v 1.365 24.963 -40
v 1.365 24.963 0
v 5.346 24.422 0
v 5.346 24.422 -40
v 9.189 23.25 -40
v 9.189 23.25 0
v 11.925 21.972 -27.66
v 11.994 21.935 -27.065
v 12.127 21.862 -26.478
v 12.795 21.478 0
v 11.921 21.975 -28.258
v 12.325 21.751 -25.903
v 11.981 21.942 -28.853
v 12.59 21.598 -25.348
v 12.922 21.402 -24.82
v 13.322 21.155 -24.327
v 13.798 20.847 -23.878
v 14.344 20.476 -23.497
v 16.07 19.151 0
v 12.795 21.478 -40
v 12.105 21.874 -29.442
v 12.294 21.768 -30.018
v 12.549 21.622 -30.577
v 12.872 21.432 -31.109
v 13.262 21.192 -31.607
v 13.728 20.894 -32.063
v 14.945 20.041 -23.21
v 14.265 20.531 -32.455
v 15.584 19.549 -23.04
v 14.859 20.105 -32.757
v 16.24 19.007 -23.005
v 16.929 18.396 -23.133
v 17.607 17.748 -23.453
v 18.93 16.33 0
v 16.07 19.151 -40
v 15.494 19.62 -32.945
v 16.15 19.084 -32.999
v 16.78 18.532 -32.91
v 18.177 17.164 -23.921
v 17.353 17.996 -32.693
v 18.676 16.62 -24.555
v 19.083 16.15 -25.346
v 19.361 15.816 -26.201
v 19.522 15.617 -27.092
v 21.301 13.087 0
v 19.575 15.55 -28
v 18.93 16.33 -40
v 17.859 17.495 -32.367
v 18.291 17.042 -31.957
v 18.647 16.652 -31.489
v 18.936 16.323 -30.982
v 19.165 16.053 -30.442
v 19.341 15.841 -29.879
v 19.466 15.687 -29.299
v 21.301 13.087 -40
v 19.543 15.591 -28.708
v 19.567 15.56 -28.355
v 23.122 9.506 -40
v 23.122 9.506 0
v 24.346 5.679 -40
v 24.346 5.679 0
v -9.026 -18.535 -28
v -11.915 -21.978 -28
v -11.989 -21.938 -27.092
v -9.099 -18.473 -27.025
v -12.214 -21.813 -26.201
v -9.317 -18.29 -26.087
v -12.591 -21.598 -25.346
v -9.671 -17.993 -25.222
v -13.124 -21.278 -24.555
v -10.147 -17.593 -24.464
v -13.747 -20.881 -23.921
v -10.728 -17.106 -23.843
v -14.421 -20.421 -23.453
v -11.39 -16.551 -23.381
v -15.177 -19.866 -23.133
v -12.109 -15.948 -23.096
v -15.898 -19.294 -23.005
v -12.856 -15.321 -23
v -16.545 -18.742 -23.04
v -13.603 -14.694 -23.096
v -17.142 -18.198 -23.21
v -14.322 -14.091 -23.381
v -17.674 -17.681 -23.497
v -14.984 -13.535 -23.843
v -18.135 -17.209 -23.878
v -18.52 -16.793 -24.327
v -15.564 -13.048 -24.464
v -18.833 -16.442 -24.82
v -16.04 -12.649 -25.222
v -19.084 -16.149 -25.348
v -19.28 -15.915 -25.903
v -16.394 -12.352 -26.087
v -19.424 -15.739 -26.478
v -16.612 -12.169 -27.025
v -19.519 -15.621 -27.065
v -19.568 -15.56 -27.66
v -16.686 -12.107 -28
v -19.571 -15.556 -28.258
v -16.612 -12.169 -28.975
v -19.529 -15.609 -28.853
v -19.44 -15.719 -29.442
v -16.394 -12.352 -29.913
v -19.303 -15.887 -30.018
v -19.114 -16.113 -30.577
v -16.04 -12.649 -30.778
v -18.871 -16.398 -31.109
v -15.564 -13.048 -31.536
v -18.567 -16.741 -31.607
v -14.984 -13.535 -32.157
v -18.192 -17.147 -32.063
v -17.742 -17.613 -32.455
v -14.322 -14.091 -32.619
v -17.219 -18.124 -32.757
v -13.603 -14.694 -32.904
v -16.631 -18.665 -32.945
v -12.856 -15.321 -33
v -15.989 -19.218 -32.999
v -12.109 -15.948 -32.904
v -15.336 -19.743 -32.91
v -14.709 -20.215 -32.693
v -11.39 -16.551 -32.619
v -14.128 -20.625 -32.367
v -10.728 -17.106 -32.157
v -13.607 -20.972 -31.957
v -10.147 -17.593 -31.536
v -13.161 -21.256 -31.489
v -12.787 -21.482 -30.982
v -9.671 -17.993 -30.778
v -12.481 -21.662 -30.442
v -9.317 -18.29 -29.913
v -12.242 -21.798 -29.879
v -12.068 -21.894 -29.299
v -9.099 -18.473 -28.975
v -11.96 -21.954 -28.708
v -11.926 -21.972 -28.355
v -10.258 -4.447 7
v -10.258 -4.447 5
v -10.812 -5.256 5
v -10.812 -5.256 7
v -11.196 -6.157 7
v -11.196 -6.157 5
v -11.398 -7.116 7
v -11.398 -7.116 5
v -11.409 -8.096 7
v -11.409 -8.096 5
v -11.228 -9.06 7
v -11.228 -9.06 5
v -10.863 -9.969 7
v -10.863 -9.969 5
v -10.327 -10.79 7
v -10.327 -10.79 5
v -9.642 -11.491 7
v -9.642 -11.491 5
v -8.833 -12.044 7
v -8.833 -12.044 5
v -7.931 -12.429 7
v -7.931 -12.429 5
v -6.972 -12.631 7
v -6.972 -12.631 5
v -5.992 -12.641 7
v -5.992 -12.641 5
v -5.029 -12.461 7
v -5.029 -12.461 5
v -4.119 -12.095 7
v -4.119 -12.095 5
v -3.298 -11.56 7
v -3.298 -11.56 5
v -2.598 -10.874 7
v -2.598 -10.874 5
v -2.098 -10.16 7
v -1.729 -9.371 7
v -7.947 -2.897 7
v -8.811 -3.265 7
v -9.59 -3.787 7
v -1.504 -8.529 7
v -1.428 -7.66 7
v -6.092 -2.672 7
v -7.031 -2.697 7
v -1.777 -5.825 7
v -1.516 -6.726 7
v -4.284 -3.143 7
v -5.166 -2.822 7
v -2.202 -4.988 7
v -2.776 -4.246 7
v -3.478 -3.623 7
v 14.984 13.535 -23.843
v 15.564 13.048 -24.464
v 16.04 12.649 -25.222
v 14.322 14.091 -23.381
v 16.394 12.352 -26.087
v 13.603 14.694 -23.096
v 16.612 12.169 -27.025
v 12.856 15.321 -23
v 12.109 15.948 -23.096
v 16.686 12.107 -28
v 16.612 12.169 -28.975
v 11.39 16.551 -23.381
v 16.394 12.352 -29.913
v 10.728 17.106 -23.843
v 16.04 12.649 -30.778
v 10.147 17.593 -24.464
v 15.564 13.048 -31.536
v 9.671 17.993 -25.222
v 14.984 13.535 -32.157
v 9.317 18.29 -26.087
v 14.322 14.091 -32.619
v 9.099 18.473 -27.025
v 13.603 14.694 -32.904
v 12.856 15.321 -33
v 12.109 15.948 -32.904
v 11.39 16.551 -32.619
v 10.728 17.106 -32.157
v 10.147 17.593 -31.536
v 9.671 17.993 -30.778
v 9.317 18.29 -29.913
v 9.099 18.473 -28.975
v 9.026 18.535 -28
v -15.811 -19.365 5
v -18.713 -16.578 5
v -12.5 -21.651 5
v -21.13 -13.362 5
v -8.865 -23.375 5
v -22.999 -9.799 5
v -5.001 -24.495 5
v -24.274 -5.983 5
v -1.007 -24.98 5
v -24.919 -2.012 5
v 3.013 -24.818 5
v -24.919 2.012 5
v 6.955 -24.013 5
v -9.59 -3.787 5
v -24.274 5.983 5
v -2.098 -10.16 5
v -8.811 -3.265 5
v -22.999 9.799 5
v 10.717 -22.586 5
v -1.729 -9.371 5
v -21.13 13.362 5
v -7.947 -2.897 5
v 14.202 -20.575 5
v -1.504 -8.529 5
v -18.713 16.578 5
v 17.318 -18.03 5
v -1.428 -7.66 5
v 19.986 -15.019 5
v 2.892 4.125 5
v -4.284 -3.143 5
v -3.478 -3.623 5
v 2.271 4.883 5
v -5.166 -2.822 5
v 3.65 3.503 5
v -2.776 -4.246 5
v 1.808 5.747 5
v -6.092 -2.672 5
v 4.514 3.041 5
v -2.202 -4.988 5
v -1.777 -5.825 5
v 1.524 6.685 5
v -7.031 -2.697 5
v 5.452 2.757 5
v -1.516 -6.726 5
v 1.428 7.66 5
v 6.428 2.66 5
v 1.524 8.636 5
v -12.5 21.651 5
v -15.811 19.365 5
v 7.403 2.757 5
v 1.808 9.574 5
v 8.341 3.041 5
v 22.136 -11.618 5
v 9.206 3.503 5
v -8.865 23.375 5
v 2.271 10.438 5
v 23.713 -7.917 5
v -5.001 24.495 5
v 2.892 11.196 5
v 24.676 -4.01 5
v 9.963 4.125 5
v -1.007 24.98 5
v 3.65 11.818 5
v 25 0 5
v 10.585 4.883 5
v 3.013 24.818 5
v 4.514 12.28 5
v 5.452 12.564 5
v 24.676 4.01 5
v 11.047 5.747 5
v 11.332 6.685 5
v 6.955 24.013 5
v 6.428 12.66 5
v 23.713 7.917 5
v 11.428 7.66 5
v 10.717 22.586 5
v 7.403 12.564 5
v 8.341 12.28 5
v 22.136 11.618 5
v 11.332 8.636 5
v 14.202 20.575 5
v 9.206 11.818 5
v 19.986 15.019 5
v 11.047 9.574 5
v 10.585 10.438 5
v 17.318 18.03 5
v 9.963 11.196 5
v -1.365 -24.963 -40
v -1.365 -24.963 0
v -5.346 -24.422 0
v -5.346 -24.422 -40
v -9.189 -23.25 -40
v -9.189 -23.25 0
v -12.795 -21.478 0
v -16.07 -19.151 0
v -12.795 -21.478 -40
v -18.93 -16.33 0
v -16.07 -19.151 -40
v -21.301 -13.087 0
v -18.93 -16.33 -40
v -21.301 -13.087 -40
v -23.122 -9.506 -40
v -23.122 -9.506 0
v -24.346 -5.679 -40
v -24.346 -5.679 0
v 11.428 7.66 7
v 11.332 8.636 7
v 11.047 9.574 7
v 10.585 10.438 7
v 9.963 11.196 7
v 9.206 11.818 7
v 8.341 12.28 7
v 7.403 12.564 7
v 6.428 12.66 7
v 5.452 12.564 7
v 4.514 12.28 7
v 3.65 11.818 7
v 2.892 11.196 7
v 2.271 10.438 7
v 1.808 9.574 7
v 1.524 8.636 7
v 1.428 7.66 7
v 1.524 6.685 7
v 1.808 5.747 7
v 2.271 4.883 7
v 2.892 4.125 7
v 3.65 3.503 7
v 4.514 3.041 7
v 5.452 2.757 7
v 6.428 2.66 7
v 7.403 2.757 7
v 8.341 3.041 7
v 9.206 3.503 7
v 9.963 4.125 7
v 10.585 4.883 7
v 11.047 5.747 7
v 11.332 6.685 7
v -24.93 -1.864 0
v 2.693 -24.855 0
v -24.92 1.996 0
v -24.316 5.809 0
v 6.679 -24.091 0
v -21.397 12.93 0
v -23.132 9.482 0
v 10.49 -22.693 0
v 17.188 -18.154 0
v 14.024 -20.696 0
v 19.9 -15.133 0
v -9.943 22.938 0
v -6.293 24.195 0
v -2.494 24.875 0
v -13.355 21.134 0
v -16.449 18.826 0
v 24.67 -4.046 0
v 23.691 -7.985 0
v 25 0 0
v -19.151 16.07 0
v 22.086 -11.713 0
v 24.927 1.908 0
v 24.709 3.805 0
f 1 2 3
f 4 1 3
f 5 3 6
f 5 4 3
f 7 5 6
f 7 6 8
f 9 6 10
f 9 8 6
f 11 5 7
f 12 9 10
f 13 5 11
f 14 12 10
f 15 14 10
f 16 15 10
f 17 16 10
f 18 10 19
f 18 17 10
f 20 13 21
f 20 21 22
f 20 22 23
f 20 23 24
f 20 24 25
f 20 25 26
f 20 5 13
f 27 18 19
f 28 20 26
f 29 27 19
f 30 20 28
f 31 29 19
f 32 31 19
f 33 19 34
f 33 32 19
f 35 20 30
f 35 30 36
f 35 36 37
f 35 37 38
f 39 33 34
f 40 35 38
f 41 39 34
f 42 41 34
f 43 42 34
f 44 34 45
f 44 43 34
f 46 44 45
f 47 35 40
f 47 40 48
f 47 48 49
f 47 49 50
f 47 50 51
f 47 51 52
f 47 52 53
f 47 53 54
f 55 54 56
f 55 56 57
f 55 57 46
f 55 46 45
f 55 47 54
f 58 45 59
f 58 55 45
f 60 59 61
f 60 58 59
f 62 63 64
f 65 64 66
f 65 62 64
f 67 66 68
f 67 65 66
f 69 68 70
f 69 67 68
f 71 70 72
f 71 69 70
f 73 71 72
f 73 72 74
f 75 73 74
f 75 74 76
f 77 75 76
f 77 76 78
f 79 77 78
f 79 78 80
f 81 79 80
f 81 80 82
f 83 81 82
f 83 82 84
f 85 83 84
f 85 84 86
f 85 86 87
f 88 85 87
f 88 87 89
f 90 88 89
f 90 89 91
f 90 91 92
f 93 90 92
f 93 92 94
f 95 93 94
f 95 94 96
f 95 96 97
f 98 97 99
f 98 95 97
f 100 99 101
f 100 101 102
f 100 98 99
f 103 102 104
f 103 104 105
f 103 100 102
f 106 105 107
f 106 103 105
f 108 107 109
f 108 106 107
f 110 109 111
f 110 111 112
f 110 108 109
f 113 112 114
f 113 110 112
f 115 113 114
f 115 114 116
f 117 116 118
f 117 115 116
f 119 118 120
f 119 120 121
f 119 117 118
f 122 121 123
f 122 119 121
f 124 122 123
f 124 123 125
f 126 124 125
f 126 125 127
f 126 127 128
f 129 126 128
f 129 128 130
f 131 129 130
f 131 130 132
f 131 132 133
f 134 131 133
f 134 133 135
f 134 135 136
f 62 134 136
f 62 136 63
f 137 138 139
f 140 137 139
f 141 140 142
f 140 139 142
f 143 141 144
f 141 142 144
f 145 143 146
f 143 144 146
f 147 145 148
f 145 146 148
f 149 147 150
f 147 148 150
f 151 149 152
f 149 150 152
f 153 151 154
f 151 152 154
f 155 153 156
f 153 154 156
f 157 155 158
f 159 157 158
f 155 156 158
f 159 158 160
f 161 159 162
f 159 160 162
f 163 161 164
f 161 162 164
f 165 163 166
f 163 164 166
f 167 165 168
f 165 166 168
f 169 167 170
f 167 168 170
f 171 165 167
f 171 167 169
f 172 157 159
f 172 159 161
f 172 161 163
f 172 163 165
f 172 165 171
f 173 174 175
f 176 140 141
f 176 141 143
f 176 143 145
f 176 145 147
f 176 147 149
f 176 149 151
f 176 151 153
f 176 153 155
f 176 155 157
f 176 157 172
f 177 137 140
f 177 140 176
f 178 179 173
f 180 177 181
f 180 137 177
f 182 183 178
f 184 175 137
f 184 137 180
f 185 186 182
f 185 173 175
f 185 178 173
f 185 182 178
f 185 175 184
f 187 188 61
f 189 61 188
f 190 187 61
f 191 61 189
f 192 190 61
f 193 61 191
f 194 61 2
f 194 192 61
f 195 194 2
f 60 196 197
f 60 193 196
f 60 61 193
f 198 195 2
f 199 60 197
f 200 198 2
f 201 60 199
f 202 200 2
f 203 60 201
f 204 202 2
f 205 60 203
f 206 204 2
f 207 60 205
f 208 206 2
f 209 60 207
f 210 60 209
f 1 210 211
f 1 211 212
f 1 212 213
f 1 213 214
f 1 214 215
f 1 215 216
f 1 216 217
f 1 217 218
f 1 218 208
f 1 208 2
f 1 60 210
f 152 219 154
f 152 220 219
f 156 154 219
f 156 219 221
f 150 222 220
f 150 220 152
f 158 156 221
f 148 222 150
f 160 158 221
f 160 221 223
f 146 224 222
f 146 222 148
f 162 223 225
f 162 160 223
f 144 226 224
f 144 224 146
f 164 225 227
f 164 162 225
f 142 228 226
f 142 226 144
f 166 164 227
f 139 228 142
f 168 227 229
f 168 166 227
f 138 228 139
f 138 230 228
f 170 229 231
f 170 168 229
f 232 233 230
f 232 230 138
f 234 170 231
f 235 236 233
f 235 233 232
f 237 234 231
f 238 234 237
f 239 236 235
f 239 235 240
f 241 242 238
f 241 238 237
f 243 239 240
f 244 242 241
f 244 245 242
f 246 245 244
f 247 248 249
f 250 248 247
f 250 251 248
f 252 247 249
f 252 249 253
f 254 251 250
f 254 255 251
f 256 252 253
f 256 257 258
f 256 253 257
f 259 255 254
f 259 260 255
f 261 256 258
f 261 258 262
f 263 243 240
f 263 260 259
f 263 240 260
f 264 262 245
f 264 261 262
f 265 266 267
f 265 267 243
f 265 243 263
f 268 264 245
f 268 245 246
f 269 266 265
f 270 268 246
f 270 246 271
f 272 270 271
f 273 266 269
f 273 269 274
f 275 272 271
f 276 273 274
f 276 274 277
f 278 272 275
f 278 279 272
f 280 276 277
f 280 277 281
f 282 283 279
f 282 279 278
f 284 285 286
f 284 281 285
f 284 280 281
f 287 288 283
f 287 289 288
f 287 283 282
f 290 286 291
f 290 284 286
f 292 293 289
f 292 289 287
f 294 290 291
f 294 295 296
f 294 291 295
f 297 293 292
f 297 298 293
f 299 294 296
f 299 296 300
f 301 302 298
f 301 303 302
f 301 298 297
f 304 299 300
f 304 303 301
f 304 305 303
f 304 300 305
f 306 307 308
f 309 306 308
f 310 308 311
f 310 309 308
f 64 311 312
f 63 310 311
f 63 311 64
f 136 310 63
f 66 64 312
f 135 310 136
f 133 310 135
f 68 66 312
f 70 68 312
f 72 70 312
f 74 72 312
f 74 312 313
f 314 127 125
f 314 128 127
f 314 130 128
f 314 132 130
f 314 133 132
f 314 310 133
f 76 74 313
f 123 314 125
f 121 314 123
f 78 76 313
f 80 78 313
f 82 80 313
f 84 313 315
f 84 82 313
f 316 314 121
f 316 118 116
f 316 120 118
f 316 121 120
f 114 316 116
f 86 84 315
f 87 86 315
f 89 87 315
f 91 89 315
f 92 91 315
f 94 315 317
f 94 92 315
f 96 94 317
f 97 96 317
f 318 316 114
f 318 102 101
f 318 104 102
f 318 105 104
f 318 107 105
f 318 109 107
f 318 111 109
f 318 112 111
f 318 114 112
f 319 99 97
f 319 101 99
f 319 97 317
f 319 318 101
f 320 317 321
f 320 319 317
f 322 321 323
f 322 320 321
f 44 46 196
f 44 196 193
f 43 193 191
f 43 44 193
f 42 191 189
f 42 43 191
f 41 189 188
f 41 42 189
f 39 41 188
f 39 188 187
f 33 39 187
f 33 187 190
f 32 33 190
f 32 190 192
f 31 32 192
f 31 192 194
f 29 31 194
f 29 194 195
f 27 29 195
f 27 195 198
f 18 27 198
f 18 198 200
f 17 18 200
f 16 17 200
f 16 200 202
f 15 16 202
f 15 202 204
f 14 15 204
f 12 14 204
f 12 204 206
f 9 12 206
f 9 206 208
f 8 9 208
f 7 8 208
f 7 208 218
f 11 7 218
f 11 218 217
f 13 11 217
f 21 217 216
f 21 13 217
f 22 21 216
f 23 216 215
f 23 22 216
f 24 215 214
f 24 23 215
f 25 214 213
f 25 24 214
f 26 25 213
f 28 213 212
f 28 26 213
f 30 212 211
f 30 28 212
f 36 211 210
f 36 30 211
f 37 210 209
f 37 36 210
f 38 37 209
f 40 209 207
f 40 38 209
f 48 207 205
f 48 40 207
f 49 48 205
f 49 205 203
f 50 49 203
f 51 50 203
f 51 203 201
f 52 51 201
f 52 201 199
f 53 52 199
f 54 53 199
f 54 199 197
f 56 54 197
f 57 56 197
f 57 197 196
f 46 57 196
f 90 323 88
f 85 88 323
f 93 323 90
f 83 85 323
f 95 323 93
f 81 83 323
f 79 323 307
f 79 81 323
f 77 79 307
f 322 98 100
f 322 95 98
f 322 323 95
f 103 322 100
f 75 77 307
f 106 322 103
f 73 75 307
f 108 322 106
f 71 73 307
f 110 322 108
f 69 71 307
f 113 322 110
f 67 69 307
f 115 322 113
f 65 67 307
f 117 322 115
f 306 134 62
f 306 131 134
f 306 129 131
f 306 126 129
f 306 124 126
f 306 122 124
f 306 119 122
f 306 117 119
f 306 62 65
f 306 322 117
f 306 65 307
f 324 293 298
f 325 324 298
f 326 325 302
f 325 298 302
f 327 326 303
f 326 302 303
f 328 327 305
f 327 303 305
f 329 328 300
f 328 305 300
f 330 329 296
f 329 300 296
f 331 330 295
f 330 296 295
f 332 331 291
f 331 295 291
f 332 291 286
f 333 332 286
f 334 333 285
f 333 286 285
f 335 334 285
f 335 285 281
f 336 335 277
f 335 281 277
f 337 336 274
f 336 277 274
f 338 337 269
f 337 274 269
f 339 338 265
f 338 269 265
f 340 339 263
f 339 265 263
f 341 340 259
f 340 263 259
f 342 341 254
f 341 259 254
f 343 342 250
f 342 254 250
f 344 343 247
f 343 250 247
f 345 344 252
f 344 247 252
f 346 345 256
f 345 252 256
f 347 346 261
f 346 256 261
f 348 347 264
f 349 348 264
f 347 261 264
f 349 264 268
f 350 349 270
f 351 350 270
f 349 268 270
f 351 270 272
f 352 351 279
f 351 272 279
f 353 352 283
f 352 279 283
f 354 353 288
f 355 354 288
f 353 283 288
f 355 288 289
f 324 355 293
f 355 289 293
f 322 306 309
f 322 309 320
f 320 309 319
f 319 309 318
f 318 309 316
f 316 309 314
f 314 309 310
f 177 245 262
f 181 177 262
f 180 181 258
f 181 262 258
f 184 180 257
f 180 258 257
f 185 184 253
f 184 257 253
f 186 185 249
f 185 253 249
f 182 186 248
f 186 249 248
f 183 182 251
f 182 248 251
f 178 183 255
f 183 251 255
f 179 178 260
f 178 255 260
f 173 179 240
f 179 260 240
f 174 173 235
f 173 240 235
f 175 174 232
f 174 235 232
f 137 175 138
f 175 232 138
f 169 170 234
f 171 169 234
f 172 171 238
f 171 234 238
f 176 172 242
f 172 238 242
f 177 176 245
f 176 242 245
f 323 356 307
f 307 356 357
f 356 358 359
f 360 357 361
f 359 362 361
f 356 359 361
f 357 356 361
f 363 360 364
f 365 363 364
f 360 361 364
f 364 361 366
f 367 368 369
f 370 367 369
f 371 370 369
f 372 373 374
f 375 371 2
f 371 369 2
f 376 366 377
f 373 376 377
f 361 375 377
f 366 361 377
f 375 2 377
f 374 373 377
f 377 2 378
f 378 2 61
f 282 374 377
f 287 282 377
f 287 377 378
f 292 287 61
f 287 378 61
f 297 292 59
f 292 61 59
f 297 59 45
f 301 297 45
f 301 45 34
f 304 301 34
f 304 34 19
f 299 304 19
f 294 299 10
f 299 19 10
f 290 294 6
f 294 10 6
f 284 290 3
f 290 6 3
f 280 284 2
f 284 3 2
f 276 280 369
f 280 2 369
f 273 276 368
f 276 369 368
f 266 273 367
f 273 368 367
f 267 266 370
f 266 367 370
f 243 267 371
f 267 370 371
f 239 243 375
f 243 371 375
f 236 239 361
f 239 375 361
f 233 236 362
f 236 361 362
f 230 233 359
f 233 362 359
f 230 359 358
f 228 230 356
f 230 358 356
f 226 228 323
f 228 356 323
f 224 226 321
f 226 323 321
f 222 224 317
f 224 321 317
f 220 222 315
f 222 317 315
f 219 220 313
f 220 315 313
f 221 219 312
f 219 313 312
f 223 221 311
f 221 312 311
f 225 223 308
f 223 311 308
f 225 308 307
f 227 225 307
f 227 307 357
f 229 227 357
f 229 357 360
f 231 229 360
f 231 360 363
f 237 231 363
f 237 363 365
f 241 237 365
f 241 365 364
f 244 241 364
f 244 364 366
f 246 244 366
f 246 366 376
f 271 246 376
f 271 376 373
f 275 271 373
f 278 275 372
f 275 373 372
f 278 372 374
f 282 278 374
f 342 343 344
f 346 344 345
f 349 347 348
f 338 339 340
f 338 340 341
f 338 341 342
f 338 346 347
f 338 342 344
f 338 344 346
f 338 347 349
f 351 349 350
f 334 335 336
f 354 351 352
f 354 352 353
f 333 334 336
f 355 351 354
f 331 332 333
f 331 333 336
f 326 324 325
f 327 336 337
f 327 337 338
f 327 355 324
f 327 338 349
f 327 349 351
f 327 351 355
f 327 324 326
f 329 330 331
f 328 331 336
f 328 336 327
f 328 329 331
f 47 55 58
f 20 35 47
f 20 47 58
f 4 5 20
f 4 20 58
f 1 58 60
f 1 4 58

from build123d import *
from build123d.topology import SkipClean

# Parameters (mm, degrees)
SKETCH1_R               = 25
BOSS_EXTRUDE1_DEPTH     = 5
SKETCH2_R               = 5
BOSS_EXTRUDE2_DEPTH     = 2
BOSS_EXTRUDE3_START     = 40
BOSS_EXTRUDE3_DEPTH     = 40
CUT_EXTRUDE1_DEPTH      = 69.255637517
CUT_EXTRUDE1_DEPTH_BACK = 69.255637517
SKETCH6_R               = 5


with BuildPart() as part:
    # Sketch1 → Boss-Extrude1 (new body)
    with BuildSketch(Plane.XY):
        Circle(SKETCH1_R)
    extrude(amount=BOSS_EXTRUDE1_DEPTH)

    # Sketch2 → Boss-Extrude2 (add)
    with BuildSketch(Plane.XY.offset(5)):
        with BuildLine():
            ThreePointArc((-1.427876097, -7.660444431), (-4.71777538, -2.961981327), (-10.258098312, -4.446506383))
            Line((-10.258098312, -4.446506383), (-2.597653881, -10.87438248))
            ThreePointArc((-2.597653881, -10.87438248), (-1.729412993, -9.370545148), (-1.427876097, -7.660444431))
        make_face()
        with BuildLine():
            Line((-2.597653881, -10.87438248), (-10.258098312, -4.446506383))
            ThreePointArc((-10.258098312, -4.446506383), (-9.641814145, -11.490666647), (-2.597653881, -10.87438248))
        make_face()
        with Locations((6.427876097, 7.660444431)):
            Circle(SKETCH2_R)
    extrude(amount=BOSS_EXTRUDE2_DEPTH)

    # Sketch3 → Boss-Extrude3 (add)
    with SkipClean():  # the faces are left unmerged after this step: merging them gives an invalid solid
        with BuildSketch(Plane(origin=(0, 0, 0), x_dir=(-1, 0, 0), z_dir=(0, 0, -1)).offset(BOSS_EXTRUDE3_START)):
            with BuildLine():
                Line((-24.346418841, 5.679074717), (-1.365085547, 24.962703008))
                ThreePointArc((-1.365085547, 24.962703008), (-16.069690242, 19.151111078), (-24.346418841, 5.679074717))
            make_face()
            with BuildLine():
                ThreePointArc((1.365085547, -24.962703008), (16.069690242, -19.151111078), (24.346418841, -5.679074717))
                Line((24.346418841, -5.679074717), (1.365085547, -24.962703008))
            make_face()
        extrude(amount=-BOSS_EXTRUDE3_DEPTH)

    # Sketch6 → Cut-Extrude1 (cut, two sides: drawn at the far end of the back side and taken through both)
    with SkipClean():  # the faces are left unmerged after this step: merging them gives an invalid solid
        with BuildSketch(Plane(origin=(12.855752194, 15.320888862, 0), x_dir=(0.7660444431189768, -0.642787609686541, 0), z_dir=(-0.642787609686541, -0.7660444431189768, 0)).offset(-CUT_EXTRUDE1_DEPTH_BACK)):
            with Locations((0, -28)):
                Circle(SKETCH6_R)
        extrude(amount=CUT_EXTRUDE1_DEPTH + CUT_EXTRUDE1_DEPTH_BACK, mode=Mode.SUBTRACT)


solid = part.part
